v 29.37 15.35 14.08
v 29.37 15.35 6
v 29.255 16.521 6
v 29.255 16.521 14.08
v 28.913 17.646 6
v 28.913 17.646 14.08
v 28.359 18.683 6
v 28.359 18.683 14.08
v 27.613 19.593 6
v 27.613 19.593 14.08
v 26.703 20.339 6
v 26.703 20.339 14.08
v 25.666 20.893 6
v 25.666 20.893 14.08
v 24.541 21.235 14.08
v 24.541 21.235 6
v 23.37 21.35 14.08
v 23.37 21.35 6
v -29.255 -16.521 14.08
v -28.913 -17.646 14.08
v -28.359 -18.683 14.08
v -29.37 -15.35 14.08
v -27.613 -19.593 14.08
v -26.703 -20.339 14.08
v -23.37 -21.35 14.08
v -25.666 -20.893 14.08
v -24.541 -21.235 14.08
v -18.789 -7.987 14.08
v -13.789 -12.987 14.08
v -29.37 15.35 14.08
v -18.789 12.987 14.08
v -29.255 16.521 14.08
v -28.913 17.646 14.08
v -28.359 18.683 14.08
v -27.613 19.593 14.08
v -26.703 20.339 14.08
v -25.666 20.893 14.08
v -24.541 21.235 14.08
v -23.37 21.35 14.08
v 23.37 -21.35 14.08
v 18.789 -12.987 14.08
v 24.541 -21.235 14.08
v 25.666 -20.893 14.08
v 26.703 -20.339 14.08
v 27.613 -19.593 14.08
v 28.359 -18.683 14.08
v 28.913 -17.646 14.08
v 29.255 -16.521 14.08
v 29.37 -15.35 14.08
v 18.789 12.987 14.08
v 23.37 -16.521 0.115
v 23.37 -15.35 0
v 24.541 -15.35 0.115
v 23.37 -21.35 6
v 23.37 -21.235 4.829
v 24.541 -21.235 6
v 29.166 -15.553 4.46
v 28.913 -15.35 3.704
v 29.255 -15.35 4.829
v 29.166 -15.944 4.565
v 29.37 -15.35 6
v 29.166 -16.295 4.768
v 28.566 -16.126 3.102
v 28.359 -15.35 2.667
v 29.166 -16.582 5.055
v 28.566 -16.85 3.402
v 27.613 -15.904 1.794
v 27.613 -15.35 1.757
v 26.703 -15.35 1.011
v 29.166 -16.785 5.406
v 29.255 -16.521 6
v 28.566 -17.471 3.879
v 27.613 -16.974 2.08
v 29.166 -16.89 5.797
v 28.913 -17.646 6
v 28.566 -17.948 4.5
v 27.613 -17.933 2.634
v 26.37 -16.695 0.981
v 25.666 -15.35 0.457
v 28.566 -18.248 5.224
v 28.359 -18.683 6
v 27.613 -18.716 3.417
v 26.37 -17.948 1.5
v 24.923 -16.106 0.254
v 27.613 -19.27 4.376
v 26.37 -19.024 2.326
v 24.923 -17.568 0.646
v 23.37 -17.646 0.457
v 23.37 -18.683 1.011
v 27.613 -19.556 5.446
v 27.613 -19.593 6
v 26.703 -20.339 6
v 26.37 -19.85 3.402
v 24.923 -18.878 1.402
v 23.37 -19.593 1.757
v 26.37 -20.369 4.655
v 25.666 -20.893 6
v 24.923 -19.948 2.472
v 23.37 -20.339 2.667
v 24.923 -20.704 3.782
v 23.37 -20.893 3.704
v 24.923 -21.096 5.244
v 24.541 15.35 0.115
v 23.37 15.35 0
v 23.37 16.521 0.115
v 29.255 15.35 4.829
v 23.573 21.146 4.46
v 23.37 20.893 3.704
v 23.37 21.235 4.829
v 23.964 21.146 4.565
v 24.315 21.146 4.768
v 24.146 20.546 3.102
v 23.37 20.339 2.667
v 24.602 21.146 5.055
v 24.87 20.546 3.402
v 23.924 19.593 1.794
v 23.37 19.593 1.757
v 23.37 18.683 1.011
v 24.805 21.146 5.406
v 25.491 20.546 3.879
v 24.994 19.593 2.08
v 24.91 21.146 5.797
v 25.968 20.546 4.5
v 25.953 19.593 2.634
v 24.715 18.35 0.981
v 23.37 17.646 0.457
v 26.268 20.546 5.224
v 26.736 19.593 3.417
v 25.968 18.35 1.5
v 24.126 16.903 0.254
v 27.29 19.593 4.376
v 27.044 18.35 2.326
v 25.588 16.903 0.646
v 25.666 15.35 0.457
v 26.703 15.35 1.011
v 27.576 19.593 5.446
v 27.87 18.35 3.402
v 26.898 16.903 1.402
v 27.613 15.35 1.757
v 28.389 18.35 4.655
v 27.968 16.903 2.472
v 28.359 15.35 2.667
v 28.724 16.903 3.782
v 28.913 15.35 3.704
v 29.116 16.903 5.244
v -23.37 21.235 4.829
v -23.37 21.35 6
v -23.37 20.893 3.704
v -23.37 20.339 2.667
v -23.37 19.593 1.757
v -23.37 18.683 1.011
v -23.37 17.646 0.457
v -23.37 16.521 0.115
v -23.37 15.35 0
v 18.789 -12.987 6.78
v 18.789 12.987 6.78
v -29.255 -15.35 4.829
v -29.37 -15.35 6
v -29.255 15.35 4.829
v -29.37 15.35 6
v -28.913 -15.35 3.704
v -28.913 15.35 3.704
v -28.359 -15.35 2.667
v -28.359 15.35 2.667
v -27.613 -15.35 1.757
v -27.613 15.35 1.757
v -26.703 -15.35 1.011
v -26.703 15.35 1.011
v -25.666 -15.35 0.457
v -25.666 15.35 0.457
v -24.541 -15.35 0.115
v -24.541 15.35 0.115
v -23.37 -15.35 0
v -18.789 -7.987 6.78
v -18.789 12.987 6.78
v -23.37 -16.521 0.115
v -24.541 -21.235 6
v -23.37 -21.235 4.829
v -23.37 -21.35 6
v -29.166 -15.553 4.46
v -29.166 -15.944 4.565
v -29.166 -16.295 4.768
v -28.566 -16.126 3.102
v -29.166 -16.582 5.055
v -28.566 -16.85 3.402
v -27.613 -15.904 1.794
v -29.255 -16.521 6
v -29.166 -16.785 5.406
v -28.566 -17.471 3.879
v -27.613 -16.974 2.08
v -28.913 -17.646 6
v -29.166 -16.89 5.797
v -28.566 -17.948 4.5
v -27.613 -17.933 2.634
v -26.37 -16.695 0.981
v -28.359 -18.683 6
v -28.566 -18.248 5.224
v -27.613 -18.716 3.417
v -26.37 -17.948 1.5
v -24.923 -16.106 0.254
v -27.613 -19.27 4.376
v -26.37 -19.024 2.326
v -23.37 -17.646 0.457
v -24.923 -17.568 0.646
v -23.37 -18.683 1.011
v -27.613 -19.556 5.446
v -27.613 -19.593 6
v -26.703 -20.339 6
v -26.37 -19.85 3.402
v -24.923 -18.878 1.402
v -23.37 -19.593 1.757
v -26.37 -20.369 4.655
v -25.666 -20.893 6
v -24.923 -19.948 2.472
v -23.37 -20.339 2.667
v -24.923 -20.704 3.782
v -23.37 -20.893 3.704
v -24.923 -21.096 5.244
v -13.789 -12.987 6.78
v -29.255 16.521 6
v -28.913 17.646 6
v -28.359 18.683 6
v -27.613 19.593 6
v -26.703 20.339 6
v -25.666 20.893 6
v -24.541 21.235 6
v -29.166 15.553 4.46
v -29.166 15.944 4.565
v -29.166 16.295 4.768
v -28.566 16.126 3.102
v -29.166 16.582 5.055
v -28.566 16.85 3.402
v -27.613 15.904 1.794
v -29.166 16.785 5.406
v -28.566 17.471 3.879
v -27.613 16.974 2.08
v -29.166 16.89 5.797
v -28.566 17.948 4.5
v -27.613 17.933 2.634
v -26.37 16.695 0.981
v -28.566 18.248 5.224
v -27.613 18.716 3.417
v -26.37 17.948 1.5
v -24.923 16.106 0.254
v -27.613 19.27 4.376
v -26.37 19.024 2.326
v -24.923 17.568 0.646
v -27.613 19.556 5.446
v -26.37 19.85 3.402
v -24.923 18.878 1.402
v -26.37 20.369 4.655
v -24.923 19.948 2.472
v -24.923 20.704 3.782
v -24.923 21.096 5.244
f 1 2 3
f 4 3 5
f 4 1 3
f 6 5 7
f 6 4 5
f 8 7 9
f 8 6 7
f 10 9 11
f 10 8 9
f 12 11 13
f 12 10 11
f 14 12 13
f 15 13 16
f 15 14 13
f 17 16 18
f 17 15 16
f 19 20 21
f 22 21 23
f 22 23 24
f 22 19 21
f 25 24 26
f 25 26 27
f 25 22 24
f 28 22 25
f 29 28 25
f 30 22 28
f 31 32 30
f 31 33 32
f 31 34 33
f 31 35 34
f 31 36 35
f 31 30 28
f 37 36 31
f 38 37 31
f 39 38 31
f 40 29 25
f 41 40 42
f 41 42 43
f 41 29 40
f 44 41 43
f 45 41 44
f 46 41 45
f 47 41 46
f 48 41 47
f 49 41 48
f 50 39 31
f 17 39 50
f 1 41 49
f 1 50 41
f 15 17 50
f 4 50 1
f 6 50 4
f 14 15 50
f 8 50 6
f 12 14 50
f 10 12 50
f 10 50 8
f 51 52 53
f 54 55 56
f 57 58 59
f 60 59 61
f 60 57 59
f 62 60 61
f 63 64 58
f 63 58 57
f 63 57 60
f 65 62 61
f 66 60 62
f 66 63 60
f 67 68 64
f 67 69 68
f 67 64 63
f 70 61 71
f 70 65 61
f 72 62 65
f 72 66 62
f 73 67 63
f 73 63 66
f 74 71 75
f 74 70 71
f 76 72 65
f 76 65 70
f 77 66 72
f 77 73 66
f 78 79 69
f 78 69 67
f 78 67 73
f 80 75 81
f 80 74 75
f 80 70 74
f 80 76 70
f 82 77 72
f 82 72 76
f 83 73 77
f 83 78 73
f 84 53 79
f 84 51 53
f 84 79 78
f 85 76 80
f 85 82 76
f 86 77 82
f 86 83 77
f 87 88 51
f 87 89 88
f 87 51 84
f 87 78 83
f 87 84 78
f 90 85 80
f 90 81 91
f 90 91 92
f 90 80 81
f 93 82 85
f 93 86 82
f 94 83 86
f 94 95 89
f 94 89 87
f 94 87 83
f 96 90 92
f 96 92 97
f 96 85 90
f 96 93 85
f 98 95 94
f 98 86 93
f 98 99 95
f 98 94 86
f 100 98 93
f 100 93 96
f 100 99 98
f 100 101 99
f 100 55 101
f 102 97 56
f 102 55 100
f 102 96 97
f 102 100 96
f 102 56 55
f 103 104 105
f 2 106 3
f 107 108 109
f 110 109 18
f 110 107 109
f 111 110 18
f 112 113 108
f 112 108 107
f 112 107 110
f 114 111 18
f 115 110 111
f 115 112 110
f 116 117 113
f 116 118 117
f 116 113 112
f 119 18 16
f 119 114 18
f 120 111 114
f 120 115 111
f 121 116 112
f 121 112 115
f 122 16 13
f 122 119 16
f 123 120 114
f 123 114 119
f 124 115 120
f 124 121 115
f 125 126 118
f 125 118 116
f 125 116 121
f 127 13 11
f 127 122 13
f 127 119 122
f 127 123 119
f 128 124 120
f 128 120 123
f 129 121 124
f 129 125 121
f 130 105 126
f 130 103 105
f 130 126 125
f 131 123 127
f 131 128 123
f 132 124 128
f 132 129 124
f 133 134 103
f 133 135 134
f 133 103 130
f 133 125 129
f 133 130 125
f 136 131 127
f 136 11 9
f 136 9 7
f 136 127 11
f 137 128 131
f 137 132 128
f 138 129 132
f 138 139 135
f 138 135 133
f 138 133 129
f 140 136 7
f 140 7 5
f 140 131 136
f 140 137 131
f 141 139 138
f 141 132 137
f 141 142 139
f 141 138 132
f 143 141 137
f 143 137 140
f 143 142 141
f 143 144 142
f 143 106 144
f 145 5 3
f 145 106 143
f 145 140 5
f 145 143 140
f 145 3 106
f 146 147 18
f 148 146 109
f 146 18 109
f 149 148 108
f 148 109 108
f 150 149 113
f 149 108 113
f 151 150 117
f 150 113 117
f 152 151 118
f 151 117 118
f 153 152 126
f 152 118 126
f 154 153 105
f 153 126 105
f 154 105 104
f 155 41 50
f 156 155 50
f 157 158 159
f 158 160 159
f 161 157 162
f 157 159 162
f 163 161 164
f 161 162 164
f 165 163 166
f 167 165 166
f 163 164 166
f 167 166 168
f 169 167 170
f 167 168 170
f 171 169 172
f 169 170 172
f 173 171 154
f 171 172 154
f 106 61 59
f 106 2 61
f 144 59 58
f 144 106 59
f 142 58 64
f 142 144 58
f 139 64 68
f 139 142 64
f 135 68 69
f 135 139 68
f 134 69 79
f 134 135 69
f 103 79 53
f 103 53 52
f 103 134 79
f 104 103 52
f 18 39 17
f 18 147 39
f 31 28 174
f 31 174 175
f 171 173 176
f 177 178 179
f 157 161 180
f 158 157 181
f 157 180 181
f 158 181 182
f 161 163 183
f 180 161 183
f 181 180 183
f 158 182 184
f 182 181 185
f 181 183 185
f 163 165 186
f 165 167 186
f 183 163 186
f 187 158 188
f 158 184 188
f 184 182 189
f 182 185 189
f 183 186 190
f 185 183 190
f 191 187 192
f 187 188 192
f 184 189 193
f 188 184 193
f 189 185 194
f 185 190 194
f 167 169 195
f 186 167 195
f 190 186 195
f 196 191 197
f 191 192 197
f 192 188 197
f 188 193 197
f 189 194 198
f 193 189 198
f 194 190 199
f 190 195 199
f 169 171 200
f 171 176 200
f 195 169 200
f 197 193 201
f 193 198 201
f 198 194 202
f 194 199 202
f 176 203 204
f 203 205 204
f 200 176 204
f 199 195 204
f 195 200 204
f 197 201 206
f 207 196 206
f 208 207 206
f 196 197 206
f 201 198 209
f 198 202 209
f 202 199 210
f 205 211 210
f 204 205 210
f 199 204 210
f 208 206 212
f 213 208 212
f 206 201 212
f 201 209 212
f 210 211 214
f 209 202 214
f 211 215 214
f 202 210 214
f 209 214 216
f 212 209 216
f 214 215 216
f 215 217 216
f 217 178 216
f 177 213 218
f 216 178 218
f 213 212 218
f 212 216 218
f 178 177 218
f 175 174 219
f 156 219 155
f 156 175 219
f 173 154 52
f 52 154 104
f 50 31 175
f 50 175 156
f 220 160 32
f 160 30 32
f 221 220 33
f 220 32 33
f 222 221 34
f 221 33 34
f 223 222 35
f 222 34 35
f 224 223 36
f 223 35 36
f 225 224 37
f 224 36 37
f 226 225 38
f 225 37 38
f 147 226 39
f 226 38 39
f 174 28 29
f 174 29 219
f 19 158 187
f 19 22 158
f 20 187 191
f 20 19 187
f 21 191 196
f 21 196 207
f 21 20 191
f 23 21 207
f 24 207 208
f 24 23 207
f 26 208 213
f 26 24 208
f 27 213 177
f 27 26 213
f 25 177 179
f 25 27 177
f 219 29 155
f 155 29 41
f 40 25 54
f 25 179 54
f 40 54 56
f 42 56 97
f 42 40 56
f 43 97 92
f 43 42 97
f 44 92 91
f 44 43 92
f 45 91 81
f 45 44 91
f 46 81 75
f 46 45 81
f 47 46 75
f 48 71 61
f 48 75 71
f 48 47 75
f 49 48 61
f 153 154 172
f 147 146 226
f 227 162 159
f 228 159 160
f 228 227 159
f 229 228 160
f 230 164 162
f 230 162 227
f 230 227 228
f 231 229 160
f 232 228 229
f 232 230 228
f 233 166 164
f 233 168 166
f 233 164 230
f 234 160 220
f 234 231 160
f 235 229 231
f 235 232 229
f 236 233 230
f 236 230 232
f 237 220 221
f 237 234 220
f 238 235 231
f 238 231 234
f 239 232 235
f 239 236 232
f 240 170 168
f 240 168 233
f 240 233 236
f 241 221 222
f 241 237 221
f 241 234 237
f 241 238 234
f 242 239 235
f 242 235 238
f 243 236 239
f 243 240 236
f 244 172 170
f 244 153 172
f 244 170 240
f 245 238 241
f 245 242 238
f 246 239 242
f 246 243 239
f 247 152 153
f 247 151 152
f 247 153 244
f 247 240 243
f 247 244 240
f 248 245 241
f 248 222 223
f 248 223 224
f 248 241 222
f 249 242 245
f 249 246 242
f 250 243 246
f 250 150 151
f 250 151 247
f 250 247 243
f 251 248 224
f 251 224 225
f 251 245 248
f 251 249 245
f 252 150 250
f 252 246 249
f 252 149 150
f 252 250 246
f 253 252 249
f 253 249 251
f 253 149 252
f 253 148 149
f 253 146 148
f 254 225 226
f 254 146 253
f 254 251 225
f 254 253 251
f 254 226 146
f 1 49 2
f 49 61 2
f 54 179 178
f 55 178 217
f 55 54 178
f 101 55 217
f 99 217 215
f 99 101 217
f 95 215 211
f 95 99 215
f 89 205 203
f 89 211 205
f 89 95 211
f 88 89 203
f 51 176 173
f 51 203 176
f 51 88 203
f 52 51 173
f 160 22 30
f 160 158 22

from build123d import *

# Parameters (mm, degrees)
F0_W     = 58.74
F0_H     = 42.7
F1_DEPTH = 14.08
F2_R     = 6
F3_W     = 37.578944
F3_H     = 25.973686
F4_DEPTH = 7.3
F5_SIZE  = 5


with BuildPart() as f1:
    # F0 (on Top) → F1 (new body)
    with BuildSketch(Plane.XY):
        Rectangle(F0_W, F0_H)
    extrude(amount=F1_DEPTH)

    # F2
    f2_edges = [f1.edges().sort_by_distance(p)[0] for p in [
        (0, -21.35, 0),
        (29.37, 0, 0),
        (0, 21.35, 0),
        (-29.37, 0, 0),
        (29.37, -21.35, 7.04),
        (29.37, 21.35, 7.04),
        (-29.37, 21.35, 7.04),
        (-29.37, -21.35, 7.04),
    ]]
    fillet(f2_edges, radius=F2_R)

    # F3 (on face) → F4 (cut)
    with BuildSketch(Plane.XY.offset(14.08)):
        Rectangle(F3_W, F3_H)
    extrude(amount=-F4_DEPTH, mode=Mode.SUBTRACT)

    # F5
    f5_edges = [f1.edges().sort_by_distance(p)[0] for p in [
        (-18.789472, -12.986843, 10.43),
    ]]
    chamfer(f5_edges, length=F5_SIZE)


solid = f1.part
